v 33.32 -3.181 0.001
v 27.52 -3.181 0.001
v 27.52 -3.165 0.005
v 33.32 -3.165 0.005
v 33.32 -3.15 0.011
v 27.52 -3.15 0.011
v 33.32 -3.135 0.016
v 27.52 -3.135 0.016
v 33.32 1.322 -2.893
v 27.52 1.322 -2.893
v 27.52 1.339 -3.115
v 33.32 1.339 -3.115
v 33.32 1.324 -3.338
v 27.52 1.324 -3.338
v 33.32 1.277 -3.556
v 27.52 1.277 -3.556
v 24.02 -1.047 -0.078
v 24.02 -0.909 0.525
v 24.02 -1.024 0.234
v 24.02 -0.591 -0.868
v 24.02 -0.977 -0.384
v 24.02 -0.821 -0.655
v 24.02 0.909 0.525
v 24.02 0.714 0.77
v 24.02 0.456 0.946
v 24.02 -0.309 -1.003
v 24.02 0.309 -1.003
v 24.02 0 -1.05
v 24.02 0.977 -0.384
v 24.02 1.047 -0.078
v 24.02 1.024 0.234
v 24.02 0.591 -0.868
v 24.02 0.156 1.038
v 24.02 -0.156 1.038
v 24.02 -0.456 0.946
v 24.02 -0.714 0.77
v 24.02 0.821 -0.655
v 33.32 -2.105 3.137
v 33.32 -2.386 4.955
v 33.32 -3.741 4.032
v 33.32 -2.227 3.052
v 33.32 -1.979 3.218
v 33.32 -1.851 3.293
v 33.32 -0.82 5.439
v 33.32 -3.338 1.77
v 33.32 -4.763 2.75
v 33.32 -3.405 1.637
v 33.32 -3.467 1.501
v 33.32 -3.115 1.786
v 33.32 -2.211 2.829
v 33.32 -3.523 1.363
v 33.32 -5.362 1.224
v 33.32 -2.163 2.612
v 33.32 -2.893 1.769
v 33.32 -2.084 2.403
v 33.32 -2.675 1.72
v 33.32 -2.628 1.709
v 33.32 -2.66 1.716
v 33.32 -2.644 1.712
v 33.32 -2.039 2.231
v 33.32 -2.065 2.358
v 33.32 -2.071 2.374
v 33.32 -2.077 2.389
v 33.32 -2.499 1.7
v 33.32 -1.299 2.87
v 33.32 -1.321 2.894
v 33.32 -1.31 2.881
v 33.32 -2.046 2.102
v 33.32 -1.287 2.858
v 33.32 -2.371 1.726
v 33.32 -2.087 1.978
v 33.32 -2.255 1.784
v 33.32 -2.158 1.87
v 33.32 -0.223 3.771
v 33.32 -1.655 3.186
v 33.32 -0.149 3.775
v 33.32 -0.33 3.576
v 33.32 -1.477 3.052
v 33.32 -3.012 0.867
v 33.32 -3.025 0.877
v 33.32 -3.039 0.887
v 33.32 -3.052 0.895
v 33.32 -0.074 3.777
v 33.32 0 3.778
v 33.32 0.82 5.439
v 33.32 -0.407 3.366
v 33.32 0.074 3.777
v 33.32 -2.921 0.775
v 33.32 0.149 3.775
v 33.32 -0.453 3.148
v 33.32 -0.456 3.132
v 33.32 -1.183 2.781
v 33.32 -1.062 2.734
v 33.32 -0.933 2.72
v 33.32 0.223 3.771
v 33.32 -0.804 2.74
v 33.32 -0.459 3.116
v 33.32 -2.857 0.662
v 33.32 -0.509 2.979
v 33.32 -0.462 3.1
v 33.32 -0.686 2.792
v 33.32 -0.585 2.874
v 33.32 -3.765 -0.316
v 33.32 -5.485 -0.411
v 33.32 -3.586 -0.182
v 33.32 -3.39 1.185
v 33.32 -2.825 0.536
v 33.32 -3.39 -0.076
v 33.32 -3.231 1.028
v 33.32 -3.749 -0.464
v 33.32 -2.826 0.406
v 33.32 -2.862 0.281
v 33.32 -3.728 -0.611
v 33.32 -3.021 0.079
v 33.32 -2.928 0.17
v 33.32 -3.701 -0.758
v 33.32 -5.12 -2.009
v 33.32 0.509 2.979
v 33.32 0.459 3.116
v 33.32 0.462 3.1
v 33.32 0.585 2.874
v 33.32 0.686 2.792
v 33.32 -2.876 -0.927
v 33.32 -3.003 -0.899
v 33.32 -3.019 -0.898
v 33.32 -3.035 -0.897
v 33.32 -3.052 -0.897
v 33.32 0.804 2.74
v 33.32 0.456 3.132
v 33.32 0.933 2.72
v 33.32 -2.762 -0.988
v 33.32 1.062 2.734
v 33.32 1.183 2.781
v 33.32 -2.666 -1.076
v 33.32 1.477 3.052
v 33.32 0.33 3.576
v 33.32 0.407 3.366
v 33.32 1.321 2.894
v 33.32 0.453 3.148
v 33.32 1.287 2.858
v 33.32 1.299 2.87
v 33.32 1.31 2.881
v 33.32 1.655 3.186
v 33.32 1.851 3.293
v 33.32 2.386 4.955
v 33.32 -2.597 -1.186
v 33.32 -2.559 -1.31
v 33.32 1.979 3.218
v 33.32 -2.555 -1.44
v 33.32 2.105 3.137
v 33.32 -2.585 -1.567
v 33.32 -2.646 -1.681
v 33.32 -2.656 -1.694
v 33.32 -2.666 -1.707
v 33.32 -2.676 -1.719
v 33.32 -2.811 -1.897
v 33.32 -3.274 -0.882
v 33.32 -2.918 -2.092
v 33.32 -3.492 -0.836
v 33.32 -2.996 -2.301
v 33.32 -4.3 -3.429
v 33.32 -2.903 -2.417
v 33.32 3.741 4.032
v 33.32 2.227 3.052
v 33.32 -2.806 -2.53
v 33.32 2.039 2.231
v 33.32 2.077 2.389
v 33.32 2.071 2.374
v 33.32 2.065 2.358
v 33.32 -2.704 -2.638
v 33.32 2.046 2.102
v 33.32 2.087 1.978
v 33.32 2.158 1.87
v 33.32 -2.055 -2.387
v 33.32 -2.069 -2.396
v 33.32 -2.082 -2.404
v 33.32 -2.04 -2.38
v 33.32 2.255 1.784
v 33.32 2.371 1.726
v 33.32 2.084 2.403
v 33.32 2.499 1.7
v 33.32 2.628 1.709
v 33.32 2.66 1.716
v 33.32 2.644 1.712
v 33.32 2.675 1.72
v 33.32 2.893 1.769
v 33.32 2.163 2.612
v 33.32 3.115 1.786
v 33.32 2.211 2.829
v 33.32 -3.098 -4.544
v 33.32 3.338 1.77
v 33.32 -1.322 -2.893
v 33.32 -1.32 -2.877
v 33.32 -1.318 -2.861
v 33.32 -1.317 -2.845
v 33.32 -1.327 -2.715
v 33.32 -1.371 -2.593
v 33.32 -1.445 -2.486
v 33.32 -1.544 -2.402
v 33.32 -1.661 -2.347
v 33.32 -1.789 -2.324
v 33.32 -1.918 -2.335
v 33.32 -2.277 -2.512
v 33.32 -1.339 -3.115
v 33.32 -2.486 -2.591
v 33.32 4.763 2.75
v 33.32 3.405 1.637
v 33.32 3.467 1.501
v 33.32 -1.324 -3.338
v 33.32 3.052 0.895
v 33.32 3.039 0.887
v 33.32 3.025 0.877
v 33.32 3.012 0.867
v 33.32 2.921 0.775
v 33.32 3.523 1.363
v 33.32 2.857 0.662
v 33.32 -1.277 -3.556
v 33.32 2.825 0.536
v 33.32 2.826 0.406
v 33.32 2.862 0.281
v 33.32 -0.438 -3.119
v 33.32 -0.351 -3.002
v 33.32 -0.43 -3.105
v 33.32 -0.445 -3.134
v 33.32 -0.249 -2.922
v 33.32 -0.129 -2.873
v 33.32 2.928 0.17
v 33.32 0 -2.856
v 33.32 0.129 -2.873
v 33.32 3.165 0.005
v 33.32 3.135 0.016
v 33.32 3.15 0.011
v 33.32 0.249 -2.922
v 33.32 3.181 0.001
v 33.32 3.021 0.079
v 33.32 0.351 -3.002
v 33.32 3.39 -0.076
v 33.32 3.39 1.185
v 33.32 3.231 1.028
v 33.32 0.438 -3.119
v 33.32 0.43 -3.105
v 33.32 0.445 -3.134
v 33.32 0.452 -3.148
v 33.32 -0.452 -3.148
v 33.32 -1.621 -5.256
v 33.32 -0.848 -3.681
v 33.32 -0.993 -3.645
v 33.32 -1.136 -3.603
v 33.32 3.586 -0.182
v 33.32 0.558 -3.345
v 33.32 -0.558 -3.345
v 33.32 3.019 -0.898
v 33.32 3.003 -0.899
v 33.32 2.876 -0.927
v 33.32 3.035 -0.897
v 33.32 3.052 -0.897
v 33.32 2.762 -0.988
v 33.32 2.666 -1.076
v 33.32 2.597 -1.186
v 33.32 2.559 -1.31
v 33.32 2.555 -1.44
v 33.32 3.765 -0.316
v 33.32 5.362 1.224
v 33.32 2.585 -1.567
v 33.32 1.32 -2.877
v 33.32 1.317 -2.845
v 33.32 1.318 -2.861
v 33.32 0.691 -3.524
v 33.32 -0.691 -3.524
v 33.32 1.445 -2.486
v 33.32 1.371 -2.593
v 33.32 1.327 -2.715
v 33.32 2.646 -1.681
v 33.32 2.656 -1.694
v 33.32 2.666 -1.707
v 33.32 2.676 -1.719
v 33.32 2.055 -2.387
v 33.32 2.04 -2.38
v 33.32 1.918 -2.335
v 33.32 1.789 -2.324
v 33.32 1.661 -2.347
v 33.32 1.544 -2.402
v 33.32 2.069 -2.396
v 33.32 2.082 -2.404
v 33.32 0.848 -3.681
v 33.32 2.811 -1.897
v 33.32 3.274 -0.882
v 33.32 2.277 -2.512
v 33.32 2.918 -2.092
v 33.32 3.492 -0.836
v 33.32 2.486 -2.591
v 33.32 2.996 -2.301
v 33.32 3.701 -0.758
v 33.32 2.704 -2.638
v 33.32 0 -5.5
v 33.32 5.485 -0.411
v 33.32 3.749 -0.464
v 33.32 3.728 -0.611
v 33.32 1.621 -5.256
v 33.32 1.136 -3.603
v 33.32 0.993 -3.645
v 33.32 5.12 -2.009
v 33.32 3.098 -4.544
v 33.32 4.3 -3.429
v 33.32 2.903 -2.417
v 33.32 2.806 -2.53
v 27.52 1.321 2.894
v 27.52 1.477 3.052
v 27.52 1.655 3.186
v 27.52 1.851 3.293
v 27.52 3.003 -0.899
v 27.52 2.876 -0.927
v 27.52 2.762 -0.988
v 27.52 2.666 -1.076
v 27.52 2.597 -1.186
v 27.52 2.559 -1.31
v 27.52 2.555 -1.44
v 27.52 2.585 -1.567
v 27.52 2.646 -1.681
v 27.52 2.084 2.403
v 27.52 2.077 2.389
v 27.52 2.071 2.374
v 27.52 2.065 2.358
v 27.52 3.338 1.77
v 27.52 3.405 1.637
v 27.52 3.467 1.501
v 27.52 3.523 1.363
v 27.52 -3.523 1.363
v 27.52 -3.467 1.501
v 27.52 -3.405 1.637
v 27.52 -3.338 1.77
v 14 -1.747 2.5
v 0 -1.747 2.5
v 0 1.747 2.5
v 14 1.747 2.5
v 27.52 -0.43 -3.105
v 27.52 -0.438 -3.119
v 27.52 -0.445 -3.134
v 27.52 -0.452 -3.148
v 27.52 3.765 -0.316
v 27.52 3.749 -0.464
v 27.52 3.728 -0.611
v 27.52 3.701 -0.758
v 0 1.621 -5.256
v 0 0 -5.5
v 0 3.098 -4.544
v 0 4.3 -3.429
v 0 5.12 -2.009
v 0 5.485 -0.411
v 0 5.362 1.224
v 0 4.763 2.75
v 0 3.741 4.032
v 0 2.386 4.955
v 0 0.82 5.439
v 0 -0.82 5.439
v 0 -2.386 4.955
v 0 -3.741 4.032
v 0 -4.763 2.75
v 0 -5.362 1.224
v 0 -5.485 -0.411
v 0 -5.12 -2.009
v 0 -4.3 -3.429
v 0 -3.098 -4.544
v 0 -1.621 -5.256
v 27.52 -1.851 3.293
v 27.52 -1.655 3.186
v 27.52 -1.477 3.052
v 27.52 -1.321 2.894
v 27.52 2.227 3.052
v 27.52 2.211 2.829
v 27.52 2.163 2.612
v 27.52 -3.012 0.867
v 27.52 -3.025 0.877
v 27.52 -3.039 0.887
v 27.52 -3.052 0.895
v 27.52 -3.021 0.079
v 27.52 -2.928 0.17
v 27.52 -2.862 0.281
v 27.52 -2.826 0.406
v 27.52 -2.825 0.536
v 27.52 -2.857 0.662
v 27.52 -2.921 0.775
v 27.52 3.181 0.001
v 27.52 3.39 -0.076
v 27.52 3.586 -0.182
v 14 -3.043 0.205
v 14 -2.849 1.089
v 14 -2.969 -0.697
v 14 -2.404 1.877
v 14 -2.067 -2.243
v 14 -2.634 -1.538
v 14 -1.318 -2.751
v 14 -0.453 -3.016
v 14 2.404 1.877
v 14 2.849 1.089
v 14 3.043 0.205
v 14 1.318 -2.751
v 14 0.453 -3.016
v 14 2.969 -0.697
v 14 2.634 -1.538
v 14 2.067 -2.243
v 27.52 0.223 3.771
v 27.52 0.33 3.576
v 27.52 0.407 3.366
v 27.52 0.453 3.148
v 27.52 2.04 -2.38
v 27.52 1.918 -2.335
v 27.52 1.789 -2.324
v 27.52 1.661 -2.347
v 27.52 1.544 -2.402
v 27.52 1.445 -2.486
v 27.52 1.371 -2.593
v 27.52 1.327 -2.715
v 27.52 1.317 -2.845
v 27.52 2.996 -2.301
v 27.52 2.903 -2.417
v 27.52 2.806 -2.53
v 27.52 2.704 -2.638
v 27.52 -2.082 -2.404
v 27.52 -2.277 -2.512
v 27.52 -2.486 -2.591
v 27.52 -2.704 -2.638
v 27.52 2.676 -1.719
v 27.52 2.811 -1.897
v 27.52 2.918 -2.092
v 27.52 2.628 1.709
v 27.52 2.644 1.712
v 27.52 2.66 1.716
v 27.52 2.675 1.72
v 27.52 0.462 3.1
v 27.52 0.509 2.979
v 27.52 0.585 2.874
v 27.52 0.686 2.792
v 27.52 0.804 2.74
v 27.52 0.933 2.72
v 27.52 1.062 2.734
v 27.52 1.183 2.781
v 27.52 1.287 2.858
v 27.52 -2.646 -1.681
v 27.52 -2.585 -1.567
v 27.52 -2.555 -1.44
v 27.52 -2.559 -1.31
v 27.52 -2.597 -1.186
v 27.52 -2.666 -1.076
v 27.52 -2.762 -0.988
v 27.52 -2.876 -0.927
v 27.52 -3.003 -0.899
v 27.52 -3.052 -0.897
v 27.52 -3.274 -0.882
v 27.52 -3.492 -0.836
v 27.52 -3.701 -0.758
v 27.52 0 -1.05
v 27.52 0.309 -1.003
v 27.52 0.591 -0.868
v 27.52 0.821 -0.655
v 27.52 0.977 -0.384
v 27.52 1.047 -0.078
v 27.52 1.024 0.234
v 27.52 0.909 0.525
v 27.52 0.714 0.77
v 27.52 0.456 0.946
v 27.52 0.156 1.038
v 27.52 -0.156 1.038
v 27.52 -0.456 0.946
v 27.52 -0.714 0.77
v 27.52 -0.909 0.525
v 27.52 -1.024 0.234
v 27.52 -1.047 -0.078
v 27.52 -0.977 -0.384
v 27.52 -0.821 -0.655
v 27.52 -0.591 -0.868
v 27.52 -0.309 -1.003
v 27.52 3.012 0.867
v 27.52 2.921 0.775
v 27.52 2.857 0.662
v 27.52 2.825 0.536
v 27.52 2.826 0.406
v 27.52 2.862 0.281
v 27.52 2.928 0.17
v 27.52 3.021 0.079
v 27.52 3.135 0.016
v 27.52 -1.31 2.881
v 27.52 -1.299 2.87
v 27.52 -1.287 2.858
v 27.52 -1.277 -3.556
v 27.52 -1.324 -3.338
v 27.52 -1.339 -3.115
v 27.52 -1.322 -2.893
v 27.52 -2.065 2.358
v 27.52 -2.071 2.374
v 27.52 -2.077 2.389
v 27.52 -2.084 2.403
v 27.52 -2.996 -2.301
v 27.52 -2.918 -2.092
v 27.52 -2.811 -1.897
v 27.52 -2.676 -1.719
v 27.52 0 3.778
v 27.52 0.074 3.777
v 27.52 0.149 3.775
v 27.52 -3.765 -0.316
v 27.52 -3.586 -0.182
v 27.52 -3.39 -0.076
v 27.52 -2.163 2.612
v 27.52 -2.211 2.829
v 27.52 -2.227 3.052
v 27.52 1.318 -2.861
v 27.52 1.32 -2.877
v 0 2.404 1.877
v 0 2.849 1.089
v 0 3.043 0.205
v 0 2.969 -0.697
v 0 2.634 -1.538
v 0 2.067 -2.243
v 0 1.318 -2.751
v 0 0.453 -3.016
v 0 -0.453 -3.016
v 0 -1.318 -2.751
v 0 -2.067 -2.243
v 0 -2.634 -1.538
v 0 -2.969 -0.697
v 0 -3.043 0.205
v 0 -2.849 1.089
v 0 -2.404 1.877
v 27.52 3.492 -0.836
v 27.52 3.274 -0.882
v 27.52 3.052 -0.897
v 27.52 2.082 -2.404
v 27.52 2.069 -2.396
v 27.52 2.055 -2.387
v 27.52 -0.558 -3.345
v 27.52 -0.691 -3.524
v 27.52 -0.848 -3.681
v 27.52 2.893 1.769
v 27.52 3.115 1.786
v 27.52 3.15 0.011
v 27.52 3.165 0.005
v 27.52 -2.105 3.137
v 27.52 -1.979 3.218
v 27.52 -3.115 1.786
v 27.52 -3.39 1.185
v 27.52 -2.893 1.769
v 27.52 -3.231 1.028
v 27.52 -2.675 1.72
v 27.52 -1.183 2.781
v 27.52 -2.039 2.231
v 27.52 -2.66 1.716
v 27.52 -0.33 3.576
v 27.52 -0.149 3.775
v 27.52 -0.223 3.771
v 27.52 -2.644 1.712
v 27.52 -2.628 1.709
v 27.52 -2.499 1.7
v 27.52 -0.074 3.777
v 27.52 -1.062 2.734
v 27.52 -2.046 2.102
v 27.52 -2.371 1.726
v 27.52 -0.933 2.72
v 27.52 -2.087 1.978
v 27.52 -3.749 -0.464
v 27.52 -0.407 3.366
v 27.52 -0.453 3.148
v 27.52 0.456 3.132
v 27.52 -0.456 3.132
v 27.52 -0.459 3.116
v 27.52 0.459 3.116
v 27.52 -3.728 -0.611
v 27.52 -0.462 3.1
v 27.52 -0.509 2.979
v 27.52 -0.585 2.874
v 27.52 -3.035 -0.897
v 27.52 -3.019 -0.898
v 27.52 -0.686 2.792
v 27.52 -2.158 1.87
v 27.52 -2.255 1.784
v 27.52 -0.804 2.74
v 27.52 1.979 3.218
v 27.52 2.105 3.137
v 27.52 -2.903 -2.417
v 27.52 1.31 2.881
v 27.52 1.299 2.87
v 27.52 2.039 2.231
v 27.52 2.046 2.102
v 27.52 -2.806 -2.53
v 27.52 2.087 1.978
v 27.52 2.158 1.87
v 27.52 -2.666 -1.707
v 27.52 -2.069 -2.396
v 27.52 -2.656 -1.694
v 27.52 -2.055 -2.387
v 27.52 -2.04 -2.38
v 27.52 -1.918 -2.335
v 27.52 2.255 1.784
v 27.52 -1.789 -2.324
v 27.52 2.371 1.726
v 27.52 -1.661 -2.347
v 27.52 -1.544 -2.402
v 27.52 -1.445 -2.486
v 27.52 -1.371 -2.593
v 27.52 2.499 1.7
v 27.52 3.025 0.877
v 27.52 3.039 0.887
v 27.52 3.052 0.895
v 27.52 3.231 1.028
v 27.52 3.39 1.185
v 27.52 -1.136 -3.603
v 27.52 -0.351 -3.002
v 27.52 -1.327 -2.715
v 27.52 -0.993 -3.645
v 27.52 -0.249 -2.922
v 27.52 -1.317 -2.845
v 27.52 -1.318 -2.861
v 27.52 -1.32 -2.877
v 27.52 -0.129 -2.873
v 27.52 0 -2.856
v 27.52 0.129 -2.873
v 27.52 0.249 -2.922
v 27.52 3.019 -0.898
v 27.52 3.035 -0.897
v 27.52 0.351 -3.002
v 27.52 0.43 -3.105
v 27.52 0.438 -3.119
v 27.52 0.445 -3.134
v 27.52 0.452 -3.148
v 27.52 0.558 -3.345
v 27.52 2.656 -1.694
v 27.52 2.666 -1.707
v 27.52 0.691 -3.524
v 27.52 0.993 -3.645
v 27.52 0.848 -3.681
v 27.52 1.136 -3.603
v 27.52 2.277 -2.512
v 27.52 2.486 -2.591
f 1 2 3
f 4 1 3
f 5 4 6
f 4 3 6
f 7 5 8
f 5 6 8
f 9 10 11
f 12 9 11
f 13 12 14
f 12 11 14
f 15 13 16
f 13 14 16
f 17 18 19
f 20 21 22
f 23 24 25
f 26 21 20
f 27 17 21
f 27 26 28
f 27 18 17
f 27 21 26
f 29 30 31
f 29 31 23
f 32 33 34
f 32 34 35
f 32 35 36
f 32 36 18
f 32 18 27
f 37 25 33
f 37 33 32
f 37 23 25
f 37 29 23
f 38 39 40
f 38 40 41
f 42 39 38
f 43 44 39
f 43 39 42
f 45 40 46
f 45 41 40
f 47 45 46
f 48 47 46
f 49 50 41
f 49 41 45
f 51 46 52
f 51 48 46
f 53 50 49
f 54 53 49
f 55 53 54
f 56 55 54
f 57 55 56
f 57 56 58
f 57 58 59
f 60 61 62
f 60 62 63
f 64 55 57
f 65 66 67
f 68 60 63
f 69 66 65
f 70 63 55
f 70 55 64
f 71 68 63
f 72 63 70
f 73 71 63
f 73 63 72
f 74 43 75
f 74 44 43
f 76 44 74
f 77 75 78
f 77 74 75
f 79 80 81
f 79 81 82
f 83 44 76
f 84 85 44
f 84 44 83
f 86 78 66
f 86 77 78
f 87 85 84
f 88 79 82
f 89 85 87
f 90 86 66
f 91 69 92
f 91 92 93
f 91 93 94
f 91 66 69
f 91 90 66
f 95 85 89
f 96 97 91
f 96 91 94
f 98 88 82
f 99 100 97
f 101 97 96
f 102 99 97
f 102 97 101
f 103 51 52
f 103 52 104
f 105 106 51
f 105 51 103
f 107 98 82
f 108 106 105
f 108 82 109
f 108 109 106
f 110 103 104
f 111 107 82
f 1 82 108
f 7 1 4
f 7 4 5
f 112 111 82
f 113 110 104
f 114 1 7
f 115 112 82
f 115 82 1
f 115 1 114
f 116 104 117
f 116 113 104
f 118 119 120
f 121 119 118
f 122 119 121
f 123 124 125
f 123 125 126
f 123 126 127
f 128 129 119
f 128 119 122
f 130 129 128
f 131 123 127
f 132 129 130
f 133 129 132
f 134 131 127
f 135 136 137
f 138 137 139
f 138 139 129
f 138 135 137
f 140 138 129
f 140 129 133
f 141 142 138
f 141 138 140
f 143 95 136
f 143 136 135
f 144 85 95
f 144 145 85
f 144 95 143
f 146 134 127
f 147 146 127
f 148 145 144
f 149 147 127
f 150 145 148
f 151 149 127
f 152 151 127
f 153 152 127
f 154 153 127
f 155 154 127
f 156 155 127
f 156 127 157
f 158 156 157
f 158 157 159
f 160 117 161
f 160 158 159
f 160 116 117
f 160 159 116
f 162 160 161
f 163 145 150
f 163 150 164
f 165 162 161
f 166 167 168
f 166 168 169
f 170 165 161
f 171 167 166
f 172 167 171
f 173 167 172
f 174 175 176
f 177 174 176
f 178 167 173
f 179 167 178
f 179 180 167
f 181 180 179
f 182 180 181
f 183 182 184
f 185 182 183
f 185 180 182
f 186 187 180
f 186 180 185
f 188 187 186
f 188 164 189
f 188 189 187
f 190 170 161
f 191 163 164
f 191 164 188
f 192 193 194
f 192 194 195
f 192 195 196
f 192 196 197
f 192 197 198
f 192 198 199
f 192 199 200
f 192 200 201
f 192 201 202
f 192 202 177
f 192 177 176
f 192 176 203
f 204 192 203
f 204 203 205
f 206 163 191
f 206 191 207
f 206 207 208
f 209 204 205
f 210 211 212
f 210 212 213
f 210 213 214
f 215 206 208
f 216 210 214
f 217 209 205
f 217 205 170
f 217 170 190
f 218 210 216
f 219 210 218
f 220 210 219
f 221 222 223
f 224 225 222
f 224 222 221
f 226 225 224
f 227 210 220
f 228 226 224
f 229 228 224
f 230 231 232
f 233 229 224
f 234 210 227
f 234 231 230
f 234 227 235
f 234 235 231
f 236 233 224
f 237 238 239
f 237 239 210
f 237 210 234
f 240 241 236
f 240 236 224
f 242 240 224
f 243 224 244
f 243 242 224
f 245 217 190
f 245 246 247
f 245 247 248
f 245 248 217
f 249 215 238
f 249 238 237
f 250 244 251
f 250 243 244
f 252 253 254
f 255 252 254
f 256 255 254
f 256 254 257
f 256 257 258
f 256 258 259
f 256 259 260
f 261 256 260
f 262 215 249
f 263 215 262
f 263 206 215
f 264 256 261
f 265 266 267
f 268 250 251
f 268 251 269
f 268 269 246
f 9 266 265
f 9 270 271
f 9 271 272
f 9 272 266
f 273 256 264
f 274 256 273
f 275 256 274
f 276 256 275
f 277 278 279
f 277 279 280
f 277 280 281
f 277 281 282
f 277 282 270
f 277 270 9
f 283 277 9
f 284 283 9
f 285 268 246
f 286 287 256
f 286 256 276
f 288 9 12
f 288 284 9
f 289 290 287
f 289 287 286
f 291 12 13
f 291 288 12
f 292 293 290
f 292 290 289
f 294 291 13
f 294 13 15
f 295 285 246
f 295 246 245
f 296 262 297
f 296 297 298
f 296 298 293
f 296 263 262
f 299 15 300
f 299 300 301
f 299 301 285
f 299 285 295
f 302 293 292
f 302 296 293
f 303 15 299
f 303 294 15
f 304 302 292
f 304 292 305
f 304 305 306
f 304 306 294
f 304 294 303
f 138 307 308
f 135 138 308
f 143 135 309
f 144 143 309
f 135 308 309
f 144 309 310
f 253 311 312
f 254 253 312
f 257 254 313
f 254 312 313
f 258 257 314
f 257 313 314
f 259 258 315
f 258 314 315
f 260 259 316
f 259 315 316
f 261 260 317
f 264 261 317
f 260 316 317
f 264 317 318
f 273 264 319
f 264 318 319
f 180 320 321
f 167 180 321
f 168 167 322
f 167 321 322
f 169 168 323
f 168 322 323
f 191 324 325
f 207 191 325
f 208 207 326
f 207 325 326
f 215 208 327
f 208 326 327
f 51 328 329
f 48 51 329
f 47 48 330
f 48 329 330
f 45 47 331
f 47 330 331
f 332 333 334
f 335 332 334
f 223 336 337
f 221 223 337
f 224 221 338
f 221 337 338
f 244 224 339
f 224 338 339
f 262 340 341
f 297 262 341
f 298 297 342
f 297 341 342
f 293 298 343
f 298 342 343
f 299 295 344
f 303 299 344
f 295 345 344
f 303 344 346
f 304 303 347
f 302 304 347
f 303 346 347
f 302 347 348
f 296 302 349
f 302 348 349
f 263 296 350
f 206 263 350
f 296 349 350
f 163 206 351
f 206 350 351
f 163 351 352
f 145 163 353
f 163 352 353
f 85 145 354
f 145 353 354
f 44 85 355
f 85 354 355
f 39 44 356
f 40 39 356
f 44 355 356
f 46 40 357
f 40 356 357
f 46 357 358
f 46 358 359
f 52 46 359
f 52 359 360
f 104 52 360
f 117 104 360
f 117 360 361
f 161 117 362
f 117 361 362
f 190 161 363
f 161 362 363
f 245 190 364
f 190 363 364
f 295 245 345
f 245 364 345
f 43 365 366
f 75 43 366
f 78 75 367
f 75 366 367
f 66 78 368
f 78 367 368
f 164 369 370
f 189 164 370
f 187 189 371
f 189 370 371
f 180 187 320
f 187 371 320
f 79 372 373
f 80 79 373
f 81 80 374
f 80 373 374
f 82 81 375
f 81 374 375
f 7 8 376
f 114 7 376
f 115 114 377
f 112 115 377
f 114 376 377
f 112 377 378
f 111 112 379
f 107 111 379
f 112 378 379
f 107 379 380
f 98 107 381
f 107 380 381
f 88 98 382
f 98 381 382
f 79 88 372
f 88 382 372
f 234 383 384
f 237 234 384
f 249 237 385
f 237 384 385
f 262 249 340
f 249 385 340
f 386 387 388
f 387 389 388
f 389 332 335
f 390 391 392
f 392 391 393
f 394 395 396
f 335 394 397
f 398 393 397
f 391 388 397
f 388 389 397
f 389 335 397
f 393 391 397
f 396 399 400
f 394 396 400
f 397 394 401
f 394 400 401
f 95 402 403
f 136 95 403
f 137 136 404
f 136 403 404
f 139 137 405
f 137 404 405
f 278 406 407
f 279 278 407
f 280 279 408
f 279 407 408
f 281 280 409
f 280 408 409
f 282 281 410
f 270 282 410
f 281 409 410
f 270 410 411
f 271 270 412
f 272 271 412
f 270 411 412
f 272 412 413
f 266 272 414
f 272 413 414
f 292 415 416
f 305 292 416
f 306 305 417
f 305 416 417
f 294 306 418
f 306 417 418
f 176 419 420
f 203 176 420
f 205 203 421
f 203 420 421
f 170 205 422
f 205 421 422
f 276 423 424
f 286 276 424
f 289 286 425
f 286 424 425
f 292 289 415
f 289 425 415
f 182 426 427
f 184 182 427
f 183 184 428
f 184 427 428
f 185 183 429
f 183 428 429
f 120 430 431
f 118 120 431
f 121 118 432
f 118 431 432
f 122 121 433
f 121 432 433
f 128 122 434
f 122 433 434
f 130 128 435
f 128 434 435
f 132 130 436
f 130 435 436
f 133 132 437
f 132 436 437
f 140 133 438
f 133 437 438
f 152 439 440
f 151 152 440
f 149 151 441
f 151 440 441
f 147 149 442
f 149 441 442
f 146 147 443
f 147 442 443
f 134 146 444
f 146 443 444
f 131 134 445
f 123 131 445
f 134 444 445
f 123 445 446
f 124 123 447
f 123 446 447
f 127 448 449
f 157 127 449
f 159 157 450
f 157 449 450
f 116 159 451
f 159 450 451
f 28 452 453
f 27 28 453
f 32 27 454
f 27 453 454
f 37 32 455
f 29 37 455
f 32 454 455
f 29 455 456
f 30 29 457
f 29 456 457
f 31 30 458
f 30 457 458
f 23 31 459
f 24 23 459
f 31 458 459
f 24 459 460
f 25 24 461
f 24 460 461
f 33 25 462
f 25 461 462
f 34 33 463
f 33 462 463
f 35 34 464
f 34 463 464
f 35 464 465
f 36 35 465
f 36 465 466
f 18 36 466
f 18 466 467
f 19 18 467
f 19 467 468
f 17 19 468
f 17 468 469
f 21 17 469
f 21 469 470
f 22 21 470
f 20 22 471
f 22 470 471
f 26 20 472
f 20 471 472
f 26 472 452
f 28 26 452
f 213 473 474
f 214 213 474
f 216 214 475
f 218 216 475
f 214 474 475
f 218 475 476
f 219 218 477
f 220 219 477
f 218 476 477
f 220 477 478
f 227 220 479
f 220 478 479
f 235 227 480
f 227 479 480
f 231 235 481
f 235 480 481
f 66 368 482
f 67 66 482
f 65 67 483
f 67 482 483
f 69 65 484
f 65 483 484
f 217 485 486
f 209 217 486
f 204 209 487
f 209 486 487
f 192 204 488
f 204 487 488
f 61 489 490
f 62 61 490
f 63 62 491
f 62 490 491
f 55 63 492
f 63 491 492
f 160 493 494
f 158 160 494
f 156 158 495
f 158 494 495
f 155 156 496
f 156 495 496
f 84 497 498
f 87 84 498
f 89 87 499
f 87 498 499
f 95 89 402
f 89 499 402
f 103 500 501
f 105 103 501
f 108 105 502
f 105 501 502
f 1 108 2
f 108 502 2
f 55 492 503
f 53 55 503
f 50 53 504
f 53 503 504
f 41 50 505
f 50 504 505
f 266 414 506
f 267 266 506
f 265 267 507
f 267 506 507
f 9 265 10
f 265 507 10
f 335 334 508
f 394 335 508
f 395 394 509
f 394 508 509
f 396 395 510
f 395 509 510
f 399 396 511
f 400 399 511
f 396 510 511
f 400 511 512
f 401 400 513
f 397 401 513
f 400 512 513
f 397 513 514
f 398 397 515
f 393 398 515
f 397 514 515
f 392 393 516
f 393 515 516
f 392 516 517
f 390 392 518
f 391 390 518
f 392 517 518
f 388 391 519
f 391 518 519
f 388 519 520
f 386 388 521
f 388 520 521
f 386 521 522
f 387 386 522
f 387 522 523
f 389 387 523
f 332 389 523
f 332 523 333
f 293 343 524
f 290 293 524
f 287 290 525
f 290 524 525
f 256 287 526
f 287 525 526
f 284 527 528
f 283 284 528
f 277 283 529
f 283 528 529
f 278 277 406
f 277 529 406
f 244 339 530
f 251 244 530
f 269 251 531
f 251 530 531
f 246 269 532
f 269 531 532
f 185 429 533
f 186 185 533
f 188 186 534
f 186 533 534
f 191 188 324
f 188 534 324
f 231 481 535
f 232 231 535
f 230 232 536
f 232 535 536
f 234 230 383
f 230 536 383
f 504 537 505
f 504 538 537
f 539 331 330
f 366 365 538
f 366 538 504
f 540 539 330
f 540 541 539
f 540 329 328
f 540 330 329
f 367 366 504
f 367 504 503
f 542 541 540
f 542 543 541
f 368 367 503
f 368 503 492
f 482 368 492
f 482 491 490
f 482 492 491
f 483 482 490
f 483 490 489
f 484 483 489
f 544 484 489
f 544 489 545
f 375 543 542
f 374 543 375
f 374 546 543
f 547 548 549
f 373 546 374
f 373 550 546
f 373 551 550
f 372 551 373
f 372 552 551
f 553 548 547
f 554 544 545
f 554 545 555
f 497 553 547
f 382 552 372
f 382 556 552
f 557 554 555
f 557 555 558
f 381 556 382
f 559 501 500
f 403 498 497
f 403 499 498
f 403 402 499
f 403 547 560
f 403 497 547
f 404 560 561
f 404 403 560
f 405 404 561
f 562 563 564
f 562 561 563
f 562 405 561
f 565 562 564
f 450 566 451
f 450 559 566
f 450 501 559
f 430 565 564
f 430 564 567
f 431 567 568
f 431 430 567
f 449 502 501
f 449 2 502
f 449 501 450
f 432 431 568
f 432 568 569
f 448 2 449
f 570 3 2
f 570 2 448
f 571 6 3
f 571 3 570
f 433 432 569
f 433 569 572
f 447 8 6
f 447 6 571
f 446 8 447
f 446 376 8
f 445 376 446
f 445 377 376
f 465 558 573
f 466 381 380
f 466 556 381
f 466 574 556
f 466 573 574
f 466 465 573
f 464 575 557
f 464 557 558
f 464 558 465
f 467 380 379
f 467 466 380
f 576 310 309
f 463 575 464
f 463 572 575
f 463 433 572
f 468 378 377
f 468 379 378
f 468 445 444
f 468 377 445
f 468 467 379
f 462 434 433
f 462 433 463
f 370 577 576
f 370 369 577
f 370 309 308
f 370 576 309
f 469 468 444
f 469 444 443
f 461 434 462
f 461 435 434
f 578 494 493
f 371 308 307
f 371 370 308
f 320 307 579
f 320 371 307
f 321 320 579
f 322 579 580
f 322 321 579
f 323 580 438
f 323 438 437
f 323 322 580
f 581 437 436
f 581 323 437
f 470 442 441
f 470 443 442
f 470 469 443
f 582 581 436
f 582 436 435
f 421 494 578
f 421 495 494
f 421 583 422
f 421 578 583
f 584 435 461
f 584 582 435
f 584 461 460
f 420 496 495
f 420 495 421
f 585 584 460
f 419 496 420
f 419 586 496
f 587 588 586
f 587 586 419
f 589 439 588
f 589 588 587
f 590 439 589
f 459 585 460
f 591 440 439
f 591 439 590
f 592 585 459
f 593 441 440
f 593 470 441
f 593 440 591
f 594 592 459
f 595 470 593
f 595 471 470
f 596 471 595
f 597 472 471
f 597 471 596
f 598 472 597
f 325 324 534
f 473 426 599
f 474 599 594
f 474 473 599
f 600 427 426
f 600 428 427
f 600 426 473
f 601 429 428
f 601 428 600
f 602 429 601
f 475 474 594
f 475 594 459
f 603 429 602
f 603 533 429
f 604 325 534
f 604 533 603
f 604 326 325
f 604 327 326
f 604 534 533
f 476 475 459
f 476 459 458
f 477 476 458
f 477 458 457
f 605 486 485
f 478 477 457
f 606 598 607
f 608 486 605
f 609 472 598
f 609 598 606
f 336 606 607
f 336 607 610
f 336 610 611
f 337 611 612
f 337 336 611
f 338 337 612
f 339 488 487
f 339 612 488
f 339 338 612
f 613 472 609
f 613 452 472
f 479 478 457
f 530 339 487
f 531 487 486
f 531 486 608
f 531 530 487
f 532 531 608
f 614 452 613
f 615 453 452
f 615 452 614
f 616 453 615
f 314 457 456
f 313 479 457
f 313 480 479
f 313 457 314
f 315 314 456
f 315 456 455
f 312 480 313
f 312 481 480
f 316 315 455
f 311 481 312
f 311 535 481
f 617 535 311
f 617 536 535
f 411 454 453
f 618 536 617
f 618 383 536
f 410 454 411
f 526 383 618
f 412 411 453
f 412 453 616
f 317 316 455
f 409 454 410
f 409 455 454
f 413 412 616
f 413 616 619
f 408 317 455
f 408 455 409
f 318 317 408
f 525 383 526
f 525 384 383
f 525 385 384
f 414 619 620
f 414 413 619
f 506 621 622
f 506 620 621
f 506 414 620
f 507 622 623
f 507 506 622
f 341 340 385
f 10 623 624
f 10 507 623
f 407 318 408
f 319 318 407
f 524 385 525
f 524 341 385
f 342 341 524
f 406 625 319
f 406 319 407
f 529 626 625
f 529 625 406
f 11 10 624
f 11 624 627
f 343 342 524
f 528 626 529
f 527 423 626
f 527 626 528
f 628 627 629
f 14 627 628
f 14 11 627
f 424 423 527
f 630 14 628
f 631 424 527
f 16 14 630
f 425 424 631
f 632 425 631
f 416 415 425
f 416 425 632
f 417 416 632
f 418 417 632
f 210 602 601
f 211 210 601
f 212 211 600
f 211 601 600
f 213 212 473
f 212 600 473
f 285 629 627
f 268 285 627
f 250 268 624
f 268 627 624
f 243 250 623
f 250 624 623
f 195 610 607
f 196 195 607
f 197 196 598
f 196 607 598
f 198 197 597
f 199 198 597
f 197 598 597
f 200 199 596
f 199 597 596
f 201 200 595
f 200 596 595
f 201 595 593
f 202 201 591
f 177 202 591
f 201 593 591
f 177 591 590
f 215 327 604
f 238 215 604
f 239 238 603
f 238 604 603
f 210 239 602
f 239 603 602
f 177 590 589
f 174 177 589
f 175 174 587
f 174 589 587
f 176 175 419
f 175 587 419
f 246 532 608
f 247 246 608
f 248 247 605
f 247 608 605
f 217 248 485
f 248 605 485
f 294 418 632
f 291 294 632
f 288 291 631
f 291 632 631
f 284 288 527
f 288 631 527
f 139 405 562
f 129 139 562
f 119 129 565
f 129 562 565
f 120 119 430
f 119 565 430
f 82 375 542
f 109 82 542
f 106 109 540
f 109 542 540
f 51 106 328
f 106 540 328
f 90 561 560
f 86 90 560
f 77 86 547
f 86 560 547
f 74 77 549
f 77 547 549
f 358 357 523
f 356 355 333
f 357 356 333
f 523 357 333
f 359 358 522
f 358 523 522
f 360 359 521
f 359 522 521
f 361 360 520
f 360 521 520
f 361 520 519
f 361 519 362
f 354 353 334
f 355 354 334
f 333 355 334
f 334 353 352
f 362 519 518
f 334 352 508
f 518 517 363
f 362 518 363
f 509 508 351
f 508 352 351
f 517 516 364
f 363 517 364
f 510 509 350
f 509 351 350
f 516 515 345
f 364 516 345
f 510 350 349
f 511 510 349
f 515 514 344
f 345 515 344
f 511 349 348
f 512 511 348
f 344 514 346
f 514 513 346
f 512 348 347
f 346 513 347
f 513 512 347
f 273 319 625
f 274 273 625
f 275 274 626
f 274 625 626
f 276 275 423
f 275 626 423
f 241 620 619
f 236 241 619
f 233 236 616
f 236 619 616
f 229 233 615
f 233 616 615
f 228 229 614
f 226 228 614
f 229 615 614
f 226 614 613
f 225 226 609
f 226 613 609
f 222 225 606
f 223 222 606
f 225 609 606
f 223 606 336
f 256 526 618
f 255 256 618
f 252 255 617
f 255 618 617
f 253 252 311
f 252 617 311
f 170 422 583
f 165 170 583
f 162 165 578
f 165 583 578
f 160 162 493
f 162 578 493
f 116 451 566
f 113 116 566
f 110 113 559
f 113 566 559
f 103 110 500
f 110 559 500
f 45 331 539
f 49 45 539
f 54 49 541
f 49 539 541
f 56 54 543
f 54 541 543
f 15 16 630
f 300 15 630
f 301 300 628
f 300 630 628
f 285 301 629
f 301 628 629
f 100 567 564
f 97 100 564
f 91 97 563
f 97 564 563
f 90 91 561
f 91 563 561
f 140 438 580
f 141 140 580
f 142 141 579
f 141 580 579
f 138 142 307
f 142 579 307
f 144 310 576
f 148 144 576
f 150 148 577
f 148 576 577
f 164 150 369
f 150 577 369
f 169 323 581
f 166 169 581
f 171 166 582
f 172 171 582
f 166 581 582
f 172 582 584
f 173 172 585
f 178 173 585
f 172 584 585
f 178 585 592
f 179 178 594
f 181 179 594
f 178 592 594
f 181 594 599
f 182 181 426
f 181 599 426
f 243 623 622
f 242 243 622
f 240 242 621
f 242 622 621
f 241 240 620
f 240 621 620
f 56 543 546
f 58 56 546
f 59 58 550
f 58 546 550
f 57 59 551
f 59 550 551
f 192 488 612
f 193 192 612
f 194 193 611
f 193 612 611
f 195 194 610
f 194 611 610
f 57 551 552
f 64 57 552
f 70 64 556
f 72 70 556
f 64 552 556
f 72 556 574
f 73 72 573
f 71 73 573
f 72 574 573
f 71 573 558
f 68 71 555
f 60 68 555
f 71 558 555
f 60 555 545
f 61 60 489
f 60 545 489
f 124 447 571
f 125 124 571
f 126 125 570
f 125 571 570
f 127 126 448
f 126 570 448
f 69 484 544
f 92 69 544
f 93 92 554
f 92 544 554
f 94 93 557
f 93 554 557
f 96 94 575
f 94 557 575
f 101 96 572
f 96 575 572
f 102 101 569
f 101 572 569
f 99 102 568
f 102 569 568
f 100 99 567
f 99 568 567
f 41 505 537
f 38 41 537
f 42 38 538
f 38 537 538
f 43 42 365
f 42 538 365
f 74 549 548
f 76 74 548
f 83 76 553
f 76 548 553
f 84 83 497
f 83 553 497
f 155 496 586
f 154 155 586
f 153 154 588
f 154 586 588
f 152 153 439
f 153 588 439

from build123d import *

# Parameters (mm, degrees)
SKETCH1_R           = 5.5
BOSS_EXTRUDE1_DEPTH = 14
SKETCH2_R           = 5.5
BOSS_EXTRUDE2_DEPTH = 13.52
SKETCH3_R           = 5.5
BOSS_EXTRUDE3_DEPTH = 5.8
SKETCH4_R           = 1.05
CUT_EXTRUDE1_DEPTH  = 3.5


with BuildPart() as part:
    # Sketch1 → Boss-Extrude1 (new body)
    with BuildSketch(Plane.YZ):
        with Locations(Location((0, 0, 0), (0, 0, 270))):
            Circle(SKETCH1_R)
        with BuildLine():
            Line((-1.747140521, 2.5), (1.747140521, 2.5))
            ThreePointArc((1.747140521, 2.5), (0, -3.05), (-1.747140521, 2.5))
        make_face(mode=Mode.SUBTRACT)
    extrude(amount=BOSS_EXTRUDE1_DEPTH)

    # Sketch2 → Boss-Extrude2 (add)
    with BuildSketch(Plane.YZ.offset(14)):
        with Locations(Location((0, 0, 0), (0, 0, 270))):
            Circle(SKETCH2_R)
    extrude(amount=BOSS_EXTRUDE2_DEPTH)

    # Sketch3 → Boss-Extrude3 (add)
    with BuildSketch(Plane.YZ.offset(27.52)):
        with Locations(Location((0, 0, 0), (0, 0, 270))):
            Circle(SKETCH3_R)
        with BuildLine():
            ThreePointArc((-1.322019746, -2.893008891), (-1.318956528, -2.868853063), (-1.317084788, -2.844575833))
            ThreePointArc((-1.317084788, -2.844575833), (-1.543809469, -2.402214423), (-2.040380396, -2.37974197))
            ThreePointArc((-2.040380396, -2.37974197), (-2.061686193, -2.391529691), (-2.0823866, -2.404350785))
            ThreePointArc((-2.0823866, -2.404350785), (-2.380259348, -2.555545236), (-2.703854763, -2.638454478))
            ThreePointArc((-2.703854763, -2.638454478), (-2.855120731, -2.473976197), (-2.996397469, -2.300842198))
            ThreePointArc((-2.996397469, -2.300842198), (-2.868279694, -1.992339732), (-2.676232473, -1.719016114))
            ThreePointArc((-2.676232473, -1.719016114), (-2.660595904, -1.700351039), (-2.645896034, -1.680939672))
            ThreePointArc((-2.645896034, -1.680939672), (-2.597470339, -1.186224957), (-3.003062861, -0.898853414))
            ThreePointArc((-3.003062861, -0.898853414), (-3.02735936, -0.897251093), (-3.051705258, -0.896845399))
            ThreePointArc((-3.051705258, -0.896845399), (-3.384033651, -0.862996099), (-3.701083558, -0.757794901))
            ThreePointArc((-3.701083558, -0.757794901), (-3.739412915, -0.537646409), (-3.764659163, -0.315616851))
            ThreePointArc((-3.764659163, -0.315616851), (-3.490090608, -0.12535376), (-3.1807603, 0.000752133))
            ThreePointArc((-3.1807603, 0.000752133), (-3.157514879, 0.008000426), (-3.134653985, 0.016382957))
            ThreePointArc((-3.134653985, 0.016382957), (-2.82645273, 0.406382552), (-3.012294086, 0.86741475))
            ThreePointArc((-3.012294086, 0.86741475), (-3.031867321, 0.881898388), (-3.052129059, 0.895402065))
            ThreePointArc((-3.052129059, 0.895402065), (-3.31340118, 1.103548202), (-3.523244473, 1.363459202))
            ThreePointArc((-3.523244473, 1.363459202), (-3.43646792, 1.569382314), (-3.337668173, 1.769814617))
            ThreePointArc((-3.337668173, 1.769814617), (-3.003822413, 1.781431146), (-2.675419206, 1.720281583))
            ThreePointArc((-2.675419206, 1.720281583), (-2.65194519, 1.713811812), (-2.628181444, 1.708504114))
            ThreePointArc((-2.628181444, 1.708504114), (-2.158056349, 1.869966471), (-2.065143222, 2.35828486))
            ThreePointArc((-2.065143222, 2.35828486), (-2.07377883, 2.381051361), (-2.083523449, 2.4033657))
            ThreePointArc((-2.083523449, 2.4033657), (-2.190787246, 2.719723746), (-2.226800162, 3.051824643))
            ThreePointArc((-2.226800162, 3.051824643), (-2.042468641, 3.178143241), (-1.850991121, 3.293342448))
            ThreePointArc((-1.850991121, 3.293342448), (-1.563861826, 3.12262425), (-1.320651417, 2.893633786))
            ThreePointArc((-1.320651417, 2.893633786), (-1.304401641, 2.875500057), (-1.287279864, 2.858187286))
            ThreePointArc((-1.287279864, 2.858187286), (-0.804492326, 2.739849249), (-0.462323977, 3.100416189))
            ThreePointArc((-0.462323977, 3.100416189), (-0.457280213, 3.124237351), (-0.453413865, 3.148277707))
            ThreePointArc((-0.453413865, 3.148277707), (-0.372613841, 3.472406218), (-0.223362534, 3.771257322))
            ThreePointArc((-0.223362534, 3.771257322), (-0.111730141, 3.776213578), (0, 3.777866145))
            ThreePointArc((0, 3.777866145), (0.111730141, 3.776213578), (0.223362534, 3.771257322))
            ThreePointArc((0.223362534, 3.771257322), (0.372613841, 3.472406218), (0.453413865, 3.148277707))
            ThreePointArc((0.453413865, 3.148277707), (0.457280213, 3.124237351), (0.462323977, 3.100416189))
            ThreePointArc((0.462323977, 3.100416189), (0.804492326, 2.739849249), (1.287279864, 2.858187286))
            ThreePointArc((1.287279864, 2.858187286), (1.304401641, 2.875500057), (1.320651417, 2.893633786))
            ThreePointArc((1.320651417, 2.893633786), (1.563861826, 3.12262425), (1.850991121, 3.293342448))
            ThreePointArc((1.850991121, 3.293342448), (2.042468641, 3.178143241), (2.226800162, 3.051824643))
            ThreePointArc((2.226800162, 3.051824643), (2.190787246, 2.719723746), (2.083523449, 2.4033657))
            ThreePointArc((2.083523449, 2.4033657), (2.07377883, 2.381051361), (2.065143222, 2.35828486))
            ThreePointArc((2.065143222, 2.35828486), (2.158056349, 1.869966471), (2.628181444, 1.708504114))
            ThreePointArc((2.628181444, 1.708504114), (2.65194519, 1.713811812), (2.675419206, 1.720281583))
            ThreePointArc((2.675419206, 1.720281583), (3.003822413, 1.781431146), (3.337668173, 1.769814617))
            ThreePointArc((3.337668173, 1.769814617), (3.43646792, 1.569382314), (3.523244473, 1.363459202))
            ThreePointArc((3.523244473, 1.363459202), (3.31340118, 1.103548202), (3.052129059, 0.895402065))
            ThreePointArc((3.052129059, 0.895402065), (3.031867321, 0.881898388), (3.012294086, 0.86741475))
            ThreePointArc((3.012294086, 0.86741475), (2.82645273, 0.406382552), (3.134653985, 0.016382957))
            ThreePointArc((3.134653985, 0.016382957), (3.157514879, 0.008000426), (3.1807603, 0.000752133))
            ThreePointArc((3.1807603, 0.000752133), (3.490090608, -0.12535376), (3.764659163, -0.315616851))
            ThreePointArc((3.764659163, -0.315616851), (3.739412915, -0.537646409), (3.701083558, -0.757794901))
            ThreePointArc((3.701083558, -0.757794901), (3.384033651, -0.862996099), (3.051705258, -0.896845399))
            ThreePointArc((3.051705258, -0.896845399), (3.02735936, -0.897251093), (3.003062861, -0.898853414))
            ThreePointArc((3.003062861, -0.898853414), (2.597470339, -1.186224957), (2.645896034, -1.680939672))
            ThreePointArc((2.645896034, -1.680939672), (2.660595904, -1.700351039), (2.676232473, -1.719016114))
            ThreePointArc((2.676232473, -1.719016114), (2.868279694, -1.992339732), (2.996397469, -2.300842198))
            ThreePointArc((2.996397469, -2.300842198), (2.855120731, -2.473976197), (2.703854763, -2.638454478))
            ThreePointArc((2.703854763, -2.638454478), (2.380259349, -2.555545235), (2.082386604, -2.404350784))
            ThreePointArc((2.082386604, -2.404350784), (2.061686196, -2.39152969), (2.0403804, -2.379741969))
            ThreePointArc((2.0403804, -2.379741969), (1.54380947, -2.402214422), (1.317084788, -2.844575834))
            ThreePointArc((1.317084788, -2.844575834), (1.318956528, -2.868853064), (1.322019746, -2.893008892))
            ThreePointArc((1.322019746, -2.893008892), (1.335810244, -3.226771918), (1.27680075, -3.555566405))
            ThreePointArc((1.27680075, -3.555566405), (1.064347889, -3.624836022), (0.848171186, -3.6814234))
            ThreePointArc((0.848171186, -3.6814234), (0.62076952, -3.436726817), (0.45192491, -3.148491786))
            ThreePointArc((0.45192491, -3.148491786), (0.441442226, -3.12651451), (0.429891573, -3.105079266))
            ThreePointArc((0.429891573, -3.105079266), (0, -2.855517783), (-0.429891573, -3.105079265))
            ThreePointArc((-0.429891573, -3.105079265), (-0.441442226, -3.12651451), (-0.45192491, -3.148491786))
            ThreePointArc((-0.45192491, -3.148491786), (-0.62076952, -3.436726817), (-0.848171186, -3.6814234))
            ThreePointArc((-0.848171186, -3.6814234), (-1.064347889, -3.624836022), (-1.27680075, -3.555566405))
            ThreePointArc((-1.27680075, -3.555566405), (-1.335810244, -3.226771917), (-1.322019746, -2.893008891))
        make_face(mode=Mode.SUBTRACT)
    extrude(amount=BOSS_EXTRUDE3_DEPTH)

    # Sketch4 → Cut-Extrude1 (cut)
    with BuildSketch(Plane.YZ.offset(27.52)):
        with Locations(Location((0, 0, 0), (0, 0, 270))):
            Circle(SKETCH4_R)
    extrude(amount=-CUT_EXTRUDE1_DEPTH, mode=Mode.SUBTRACT)


solid = part.part
